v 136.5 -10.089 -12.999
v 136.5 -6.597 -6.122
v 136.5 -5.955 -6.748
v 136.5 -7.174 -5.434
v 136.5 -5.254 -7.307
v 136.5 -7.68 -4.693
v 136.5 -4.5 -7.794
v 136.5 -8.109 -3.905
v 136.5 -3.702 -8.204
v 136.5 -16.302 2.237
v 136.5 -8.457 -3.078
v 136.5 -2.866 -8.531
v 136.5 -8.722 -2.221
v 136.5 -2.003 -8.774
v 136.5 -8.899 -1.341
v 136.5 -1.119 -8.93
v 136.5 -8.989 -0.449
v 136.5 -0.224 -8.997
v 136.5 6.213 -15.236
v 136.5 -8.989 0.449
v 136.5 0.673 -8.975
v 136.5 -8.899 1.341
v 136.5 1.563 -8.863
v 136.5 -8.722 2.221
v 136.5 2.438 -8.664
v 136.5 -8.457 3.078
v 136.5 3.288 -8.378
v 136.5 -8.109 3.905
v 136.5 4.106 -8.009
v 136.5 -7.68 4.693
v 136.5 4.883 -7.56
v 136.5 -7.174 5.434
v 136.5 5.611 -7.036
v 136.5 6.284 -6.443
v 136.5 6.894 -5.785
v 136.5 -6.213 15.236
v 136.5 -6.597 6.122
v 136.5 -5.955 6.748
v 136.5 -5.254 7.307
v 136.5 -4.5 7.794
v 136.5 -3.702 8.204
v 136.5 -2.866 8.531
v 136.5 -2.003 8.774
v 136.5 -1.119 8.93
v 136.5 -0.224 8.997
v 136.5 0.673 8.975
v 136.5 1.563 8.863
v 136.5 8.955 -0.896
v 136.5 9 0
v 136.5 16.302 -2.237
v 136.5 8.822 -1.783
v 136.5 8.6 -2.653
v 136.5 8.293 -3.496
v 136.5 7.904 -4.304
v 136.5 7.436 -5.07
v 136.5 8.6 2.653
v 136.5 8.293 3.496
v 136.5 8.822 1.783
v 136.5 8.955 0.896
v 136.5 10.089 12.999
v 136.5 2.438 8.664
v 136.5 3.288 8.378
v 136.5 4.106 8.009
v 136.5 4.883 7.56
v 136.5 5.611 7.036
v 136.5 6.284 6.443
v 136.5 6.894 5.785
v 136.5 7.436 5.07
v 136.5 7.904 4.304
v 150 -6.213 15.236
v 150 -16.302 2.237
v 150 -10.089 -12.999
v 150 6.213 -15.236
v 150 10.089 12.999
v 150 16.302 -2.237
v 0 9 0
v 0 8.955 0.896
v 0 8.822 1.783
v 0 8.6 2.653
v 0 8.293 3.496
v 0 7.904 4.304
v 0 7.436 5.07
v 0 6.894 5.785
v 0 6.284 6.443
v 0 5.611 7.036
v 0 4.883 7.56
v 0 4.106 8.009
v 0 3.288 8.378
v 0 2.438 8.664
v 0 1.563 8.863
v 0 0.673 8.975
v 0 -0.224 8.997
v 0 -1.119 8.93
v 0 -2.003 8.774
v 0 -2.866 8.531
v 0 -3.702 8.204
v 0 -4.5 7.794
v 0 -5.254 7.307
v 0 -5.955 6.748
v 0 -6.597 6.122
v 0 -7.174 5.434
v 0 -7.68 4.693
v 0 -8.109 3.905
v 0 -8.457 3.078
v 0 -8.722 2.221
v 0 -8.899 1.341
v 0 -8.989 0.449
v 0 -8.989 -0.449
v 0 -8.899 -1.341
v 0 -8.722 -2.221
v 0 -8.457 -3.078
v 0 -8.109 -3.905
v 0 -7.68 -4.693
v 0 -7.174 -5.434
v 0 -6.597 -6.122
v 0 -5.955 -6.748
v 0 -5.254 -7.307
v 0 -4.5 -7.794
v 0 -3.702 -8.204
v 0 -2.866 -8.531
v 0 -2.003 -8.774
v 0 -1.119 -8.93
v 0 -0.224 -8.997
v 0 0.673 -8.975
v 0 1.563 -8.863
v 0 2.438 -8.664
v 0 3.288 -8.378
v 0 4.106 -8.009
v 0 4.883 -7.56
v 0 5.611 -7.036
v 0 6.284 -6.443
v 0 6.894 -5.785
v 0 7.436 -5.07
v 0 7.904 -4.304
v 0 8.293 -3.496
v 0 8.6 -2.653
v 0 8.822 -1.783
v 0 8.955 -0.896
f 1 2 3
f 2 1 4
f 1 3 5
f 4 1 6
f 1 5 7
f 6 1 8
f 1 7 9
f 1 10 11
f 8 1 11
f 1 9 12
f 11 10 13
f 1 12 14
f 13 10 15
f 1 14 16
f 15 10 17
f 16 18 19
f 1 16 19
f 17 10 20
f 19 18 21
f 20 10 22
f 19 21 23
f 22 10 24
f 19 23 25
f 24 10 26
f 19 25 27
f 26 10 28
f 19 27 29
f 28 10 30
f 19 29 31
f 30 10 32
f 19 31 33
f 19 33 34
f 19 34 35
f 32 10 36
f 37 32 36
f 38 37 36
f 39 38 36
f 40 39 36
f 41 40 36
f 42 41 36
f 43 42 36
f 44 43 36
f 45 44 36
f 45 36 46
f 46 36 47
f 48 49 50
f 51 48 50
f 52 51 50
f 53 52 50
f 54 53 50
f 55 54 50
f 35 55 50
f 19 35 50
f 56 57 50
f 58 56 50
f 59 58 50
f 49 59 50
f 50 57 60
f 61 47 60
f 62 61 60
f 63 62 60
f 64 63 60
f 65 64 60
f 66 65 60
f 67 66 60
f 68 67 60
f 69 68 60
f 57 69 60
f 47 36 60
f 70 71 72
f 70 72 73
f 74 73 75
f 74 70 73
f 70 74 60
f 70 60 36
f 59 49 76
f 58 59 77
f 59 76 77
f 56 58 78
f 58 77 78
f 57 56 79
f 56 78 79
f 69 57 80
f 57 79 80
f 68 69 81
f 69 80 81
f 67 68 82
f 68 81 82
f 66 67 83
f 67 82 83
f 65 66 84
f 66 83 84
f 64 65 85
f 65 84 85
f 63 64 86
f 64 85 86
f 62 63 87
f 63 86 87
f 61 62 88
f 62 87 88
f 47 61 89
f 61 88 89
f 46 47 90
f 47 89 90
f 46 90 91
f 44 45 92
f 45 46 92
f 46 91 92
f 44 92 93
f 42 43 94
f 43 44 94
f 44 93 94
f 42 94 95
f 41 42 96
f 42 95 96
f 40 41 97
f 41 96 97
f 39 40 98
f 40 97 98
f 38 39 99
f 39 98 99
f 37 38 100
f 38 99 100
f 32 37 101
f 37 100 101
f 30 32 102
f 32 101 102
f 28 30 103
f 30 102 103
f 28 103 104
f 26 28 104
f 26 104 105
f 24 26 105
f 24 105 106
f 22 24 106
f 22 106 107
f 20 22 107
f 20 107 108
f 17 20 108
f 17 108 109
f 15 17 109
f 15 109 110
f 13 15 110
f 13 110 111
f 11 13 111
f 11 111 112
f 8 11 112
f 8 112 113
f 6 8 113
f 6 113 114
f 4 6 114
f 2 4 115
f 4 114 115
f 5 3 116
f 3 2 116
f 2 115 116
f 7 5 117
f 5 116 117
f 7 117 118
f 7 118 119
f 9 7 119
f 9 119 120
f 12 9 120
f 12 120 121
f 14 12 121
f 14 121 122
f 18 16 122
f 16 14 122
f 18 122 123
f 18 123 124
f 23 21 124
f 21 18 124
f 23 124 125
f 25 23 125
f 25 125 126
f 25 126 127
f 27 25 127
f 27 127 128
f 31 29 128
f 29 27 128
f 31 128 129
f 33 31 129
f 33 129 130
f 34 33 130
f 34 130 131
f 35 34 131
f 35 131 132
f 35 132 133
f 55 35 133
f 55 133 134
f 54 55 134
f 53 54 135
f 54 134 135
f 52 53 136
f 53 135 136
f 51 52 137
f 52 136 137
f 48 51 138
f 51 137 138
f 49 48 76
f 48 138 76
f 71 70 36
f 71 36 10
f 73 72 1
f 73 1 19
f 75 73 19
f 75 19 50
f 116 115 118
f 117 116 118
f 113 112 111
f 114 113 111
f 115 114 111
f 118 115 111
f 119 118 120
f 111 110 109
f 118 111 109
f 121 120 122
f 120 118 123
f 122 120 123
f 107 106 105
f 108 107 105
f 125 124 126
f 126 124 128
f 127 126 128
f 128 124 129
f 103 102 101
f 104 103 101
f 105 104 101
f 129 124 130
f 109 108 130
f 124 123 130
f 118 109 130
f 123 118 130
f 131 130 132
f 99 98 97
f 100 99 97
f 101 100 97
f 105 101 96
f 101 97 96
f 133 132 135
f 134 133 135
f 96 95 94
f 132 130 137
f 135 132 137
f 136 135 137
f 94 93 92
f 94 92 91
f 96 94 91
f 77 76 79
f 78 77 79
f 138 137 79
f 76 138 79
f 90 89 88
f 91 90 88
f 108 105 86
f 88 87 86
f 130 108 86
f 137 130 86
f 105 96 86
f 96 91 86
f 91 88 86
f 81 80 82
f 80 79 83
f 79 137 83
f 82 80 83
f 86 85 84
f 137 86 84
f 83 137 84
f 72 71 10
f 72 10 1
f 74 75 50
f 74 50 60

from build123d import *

# Parameters (mm, degrees)
F0_R     = 9
F1_DEPTH = 150
F3_DEPTH = 13.5


with BuildPart() as f1:
    # F0 (on Right) → F1 (new body)
    with BuildSketch(Plane.YZ):
        Circle(F0_R)
    extrude(amount=F1_DEPTH)

    # F2 (on face) → F3 (join)
    with BuildSketch(Plane.YZ.offset(150)):
        Polygon((-16.301647, 2.23748), (-10.088538, -12.9989), (6.213108, -15.23638), (16.301647, -2.23748), (10.088538, 12.9989), (-6.213108, 15.23638), align=None)
    extrude(amount=-F3_DEPTH)


solid = f1.part
